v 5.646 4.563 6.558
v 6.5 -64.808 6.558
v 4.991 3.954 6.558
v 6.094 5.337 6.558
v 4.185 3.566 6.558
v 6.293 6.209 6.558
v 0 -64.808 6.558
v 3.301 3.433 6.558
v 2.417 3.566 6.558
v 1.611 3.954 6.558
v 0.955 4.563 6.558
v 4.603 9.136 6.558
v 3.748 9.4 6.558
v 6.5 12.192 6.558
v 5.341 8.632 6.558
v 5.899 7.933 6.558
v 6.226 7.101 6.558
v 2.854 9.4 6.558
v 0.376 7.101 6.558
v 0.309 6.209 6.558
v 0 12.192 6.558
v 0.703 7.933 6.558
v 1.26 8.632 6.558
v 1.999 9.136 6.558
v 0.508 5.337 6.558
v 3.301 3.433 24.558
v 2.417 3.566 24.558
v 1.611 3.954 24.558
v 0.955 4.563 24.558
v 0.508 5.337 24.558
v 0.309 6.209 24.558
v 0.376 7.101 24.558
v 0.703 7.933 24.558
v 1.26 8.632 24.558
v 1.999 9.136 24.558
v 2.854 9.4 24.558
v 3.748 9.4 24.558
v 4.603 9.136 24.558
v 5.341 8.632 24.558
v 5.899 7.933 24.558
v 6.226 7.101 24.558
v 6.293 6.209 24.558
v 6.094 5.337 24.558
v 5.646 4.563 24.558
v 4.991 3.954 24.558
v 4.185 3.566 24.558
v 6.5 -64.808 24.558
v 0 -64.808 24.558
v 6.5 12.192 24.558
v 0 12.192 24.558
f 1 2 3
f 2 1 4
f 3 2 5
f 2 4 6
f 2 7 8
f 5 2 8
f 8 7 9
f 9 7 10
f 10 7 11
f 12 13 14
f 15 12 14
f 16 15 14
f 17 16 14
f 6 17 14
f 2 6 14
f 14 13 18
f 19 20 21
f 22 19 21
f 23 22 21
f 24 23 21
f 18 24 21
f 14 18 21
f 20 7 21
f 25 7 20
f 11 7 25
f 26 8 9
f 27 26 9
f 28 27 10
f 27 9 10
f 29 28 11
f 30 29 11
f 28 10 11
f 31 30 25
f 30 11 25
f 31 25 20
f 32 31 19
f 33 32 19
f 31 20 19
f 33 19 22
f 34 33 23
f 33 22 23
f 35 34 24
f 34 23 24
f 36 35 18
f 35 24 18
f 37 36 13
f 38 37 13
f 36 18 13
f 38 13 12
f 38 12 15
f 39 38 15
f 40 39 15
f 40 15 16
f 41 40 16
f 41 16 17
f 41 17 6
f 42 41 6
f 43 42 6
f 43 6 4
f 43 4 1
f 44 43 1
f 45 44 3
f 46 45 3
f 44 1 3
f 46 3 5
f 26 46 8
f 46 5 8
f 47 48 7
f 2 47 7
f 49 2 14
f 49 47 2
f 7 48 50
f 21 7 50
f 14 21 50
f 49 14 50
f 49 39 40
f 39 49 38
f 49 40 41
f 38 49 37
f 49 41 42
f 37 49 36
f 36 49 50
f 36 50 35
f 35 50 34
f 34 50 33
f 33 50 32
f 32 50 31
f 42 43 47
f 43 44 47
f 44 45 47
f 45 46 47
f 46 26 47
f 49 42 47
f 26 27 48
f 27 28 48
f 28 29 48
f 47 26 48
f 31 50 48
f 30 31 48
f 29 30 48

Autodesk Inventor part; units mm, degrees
ref_plane "YZ Plane" through (0, 0, 0) normal (1, 0, 0) x (0, 1, 0)
ref_plane "XZ Plane" through (0, 0, 0) normal (0, 1, 0) x (-1, 0, 0)
ref_plane "XY Plane" through (0, 0, 0) normal (0, 0, 1) x (1, 0, 0)
sketch "Sketch1" plane through (0, 0, 0) normal (1, 0, 0) x (0, 1, 0)
  line L0 (12.1919, 24.5577) -> (-64.8081, 24.5577)
  line L1 (-64.8081, 24.5577) -> (-64.8081, 6.5577)
  line L2 (-64.8081, 6.5577) -> (12.1919, 6.5577)
  line L3 (12.1919, 6.5577) -> (12.1919, 24.5577)
  point P0 (0, 0)
  dimension "d0" = 77
  dimension "d1" = 18
extrude "Plate1" add sketch "Sketch1" along normal blind 6.5
sketch "Sketch2" plane through (0, -64.8081, 24.5577) normal (0, 0, 1) x (1, 0, 0)
  point P0 (0, 64.8081)
  point P1 (3.3009, 71.2411)
hole "Hole1" at (3.3009, 6.4331, 24.5577) direction (0, 0, -1) diameter 6 end through all
equation "\"d8\" = Thickness"
equation "\"d2\" = Thickness"
equation "\"BendRadius\" = Thickness"
equation "\"BendReliefWidth\" = Thickness"
equation "\"BendReliefDepth\" = 0.5 * Thickness"
equation "\"CornerReliefSize\" = 4 * Thickness"
equation "\"MinimumRemnant\" = 2 * Thickness"
equation "\"TransitionRadius\" = BendRadius"
equation "\"JacobiRadiusSize\" = BendRadius"
equation "\"GapSize\" = Thickness"
equation "\"Thickness\" = 6.5"
properties part number "blde"
